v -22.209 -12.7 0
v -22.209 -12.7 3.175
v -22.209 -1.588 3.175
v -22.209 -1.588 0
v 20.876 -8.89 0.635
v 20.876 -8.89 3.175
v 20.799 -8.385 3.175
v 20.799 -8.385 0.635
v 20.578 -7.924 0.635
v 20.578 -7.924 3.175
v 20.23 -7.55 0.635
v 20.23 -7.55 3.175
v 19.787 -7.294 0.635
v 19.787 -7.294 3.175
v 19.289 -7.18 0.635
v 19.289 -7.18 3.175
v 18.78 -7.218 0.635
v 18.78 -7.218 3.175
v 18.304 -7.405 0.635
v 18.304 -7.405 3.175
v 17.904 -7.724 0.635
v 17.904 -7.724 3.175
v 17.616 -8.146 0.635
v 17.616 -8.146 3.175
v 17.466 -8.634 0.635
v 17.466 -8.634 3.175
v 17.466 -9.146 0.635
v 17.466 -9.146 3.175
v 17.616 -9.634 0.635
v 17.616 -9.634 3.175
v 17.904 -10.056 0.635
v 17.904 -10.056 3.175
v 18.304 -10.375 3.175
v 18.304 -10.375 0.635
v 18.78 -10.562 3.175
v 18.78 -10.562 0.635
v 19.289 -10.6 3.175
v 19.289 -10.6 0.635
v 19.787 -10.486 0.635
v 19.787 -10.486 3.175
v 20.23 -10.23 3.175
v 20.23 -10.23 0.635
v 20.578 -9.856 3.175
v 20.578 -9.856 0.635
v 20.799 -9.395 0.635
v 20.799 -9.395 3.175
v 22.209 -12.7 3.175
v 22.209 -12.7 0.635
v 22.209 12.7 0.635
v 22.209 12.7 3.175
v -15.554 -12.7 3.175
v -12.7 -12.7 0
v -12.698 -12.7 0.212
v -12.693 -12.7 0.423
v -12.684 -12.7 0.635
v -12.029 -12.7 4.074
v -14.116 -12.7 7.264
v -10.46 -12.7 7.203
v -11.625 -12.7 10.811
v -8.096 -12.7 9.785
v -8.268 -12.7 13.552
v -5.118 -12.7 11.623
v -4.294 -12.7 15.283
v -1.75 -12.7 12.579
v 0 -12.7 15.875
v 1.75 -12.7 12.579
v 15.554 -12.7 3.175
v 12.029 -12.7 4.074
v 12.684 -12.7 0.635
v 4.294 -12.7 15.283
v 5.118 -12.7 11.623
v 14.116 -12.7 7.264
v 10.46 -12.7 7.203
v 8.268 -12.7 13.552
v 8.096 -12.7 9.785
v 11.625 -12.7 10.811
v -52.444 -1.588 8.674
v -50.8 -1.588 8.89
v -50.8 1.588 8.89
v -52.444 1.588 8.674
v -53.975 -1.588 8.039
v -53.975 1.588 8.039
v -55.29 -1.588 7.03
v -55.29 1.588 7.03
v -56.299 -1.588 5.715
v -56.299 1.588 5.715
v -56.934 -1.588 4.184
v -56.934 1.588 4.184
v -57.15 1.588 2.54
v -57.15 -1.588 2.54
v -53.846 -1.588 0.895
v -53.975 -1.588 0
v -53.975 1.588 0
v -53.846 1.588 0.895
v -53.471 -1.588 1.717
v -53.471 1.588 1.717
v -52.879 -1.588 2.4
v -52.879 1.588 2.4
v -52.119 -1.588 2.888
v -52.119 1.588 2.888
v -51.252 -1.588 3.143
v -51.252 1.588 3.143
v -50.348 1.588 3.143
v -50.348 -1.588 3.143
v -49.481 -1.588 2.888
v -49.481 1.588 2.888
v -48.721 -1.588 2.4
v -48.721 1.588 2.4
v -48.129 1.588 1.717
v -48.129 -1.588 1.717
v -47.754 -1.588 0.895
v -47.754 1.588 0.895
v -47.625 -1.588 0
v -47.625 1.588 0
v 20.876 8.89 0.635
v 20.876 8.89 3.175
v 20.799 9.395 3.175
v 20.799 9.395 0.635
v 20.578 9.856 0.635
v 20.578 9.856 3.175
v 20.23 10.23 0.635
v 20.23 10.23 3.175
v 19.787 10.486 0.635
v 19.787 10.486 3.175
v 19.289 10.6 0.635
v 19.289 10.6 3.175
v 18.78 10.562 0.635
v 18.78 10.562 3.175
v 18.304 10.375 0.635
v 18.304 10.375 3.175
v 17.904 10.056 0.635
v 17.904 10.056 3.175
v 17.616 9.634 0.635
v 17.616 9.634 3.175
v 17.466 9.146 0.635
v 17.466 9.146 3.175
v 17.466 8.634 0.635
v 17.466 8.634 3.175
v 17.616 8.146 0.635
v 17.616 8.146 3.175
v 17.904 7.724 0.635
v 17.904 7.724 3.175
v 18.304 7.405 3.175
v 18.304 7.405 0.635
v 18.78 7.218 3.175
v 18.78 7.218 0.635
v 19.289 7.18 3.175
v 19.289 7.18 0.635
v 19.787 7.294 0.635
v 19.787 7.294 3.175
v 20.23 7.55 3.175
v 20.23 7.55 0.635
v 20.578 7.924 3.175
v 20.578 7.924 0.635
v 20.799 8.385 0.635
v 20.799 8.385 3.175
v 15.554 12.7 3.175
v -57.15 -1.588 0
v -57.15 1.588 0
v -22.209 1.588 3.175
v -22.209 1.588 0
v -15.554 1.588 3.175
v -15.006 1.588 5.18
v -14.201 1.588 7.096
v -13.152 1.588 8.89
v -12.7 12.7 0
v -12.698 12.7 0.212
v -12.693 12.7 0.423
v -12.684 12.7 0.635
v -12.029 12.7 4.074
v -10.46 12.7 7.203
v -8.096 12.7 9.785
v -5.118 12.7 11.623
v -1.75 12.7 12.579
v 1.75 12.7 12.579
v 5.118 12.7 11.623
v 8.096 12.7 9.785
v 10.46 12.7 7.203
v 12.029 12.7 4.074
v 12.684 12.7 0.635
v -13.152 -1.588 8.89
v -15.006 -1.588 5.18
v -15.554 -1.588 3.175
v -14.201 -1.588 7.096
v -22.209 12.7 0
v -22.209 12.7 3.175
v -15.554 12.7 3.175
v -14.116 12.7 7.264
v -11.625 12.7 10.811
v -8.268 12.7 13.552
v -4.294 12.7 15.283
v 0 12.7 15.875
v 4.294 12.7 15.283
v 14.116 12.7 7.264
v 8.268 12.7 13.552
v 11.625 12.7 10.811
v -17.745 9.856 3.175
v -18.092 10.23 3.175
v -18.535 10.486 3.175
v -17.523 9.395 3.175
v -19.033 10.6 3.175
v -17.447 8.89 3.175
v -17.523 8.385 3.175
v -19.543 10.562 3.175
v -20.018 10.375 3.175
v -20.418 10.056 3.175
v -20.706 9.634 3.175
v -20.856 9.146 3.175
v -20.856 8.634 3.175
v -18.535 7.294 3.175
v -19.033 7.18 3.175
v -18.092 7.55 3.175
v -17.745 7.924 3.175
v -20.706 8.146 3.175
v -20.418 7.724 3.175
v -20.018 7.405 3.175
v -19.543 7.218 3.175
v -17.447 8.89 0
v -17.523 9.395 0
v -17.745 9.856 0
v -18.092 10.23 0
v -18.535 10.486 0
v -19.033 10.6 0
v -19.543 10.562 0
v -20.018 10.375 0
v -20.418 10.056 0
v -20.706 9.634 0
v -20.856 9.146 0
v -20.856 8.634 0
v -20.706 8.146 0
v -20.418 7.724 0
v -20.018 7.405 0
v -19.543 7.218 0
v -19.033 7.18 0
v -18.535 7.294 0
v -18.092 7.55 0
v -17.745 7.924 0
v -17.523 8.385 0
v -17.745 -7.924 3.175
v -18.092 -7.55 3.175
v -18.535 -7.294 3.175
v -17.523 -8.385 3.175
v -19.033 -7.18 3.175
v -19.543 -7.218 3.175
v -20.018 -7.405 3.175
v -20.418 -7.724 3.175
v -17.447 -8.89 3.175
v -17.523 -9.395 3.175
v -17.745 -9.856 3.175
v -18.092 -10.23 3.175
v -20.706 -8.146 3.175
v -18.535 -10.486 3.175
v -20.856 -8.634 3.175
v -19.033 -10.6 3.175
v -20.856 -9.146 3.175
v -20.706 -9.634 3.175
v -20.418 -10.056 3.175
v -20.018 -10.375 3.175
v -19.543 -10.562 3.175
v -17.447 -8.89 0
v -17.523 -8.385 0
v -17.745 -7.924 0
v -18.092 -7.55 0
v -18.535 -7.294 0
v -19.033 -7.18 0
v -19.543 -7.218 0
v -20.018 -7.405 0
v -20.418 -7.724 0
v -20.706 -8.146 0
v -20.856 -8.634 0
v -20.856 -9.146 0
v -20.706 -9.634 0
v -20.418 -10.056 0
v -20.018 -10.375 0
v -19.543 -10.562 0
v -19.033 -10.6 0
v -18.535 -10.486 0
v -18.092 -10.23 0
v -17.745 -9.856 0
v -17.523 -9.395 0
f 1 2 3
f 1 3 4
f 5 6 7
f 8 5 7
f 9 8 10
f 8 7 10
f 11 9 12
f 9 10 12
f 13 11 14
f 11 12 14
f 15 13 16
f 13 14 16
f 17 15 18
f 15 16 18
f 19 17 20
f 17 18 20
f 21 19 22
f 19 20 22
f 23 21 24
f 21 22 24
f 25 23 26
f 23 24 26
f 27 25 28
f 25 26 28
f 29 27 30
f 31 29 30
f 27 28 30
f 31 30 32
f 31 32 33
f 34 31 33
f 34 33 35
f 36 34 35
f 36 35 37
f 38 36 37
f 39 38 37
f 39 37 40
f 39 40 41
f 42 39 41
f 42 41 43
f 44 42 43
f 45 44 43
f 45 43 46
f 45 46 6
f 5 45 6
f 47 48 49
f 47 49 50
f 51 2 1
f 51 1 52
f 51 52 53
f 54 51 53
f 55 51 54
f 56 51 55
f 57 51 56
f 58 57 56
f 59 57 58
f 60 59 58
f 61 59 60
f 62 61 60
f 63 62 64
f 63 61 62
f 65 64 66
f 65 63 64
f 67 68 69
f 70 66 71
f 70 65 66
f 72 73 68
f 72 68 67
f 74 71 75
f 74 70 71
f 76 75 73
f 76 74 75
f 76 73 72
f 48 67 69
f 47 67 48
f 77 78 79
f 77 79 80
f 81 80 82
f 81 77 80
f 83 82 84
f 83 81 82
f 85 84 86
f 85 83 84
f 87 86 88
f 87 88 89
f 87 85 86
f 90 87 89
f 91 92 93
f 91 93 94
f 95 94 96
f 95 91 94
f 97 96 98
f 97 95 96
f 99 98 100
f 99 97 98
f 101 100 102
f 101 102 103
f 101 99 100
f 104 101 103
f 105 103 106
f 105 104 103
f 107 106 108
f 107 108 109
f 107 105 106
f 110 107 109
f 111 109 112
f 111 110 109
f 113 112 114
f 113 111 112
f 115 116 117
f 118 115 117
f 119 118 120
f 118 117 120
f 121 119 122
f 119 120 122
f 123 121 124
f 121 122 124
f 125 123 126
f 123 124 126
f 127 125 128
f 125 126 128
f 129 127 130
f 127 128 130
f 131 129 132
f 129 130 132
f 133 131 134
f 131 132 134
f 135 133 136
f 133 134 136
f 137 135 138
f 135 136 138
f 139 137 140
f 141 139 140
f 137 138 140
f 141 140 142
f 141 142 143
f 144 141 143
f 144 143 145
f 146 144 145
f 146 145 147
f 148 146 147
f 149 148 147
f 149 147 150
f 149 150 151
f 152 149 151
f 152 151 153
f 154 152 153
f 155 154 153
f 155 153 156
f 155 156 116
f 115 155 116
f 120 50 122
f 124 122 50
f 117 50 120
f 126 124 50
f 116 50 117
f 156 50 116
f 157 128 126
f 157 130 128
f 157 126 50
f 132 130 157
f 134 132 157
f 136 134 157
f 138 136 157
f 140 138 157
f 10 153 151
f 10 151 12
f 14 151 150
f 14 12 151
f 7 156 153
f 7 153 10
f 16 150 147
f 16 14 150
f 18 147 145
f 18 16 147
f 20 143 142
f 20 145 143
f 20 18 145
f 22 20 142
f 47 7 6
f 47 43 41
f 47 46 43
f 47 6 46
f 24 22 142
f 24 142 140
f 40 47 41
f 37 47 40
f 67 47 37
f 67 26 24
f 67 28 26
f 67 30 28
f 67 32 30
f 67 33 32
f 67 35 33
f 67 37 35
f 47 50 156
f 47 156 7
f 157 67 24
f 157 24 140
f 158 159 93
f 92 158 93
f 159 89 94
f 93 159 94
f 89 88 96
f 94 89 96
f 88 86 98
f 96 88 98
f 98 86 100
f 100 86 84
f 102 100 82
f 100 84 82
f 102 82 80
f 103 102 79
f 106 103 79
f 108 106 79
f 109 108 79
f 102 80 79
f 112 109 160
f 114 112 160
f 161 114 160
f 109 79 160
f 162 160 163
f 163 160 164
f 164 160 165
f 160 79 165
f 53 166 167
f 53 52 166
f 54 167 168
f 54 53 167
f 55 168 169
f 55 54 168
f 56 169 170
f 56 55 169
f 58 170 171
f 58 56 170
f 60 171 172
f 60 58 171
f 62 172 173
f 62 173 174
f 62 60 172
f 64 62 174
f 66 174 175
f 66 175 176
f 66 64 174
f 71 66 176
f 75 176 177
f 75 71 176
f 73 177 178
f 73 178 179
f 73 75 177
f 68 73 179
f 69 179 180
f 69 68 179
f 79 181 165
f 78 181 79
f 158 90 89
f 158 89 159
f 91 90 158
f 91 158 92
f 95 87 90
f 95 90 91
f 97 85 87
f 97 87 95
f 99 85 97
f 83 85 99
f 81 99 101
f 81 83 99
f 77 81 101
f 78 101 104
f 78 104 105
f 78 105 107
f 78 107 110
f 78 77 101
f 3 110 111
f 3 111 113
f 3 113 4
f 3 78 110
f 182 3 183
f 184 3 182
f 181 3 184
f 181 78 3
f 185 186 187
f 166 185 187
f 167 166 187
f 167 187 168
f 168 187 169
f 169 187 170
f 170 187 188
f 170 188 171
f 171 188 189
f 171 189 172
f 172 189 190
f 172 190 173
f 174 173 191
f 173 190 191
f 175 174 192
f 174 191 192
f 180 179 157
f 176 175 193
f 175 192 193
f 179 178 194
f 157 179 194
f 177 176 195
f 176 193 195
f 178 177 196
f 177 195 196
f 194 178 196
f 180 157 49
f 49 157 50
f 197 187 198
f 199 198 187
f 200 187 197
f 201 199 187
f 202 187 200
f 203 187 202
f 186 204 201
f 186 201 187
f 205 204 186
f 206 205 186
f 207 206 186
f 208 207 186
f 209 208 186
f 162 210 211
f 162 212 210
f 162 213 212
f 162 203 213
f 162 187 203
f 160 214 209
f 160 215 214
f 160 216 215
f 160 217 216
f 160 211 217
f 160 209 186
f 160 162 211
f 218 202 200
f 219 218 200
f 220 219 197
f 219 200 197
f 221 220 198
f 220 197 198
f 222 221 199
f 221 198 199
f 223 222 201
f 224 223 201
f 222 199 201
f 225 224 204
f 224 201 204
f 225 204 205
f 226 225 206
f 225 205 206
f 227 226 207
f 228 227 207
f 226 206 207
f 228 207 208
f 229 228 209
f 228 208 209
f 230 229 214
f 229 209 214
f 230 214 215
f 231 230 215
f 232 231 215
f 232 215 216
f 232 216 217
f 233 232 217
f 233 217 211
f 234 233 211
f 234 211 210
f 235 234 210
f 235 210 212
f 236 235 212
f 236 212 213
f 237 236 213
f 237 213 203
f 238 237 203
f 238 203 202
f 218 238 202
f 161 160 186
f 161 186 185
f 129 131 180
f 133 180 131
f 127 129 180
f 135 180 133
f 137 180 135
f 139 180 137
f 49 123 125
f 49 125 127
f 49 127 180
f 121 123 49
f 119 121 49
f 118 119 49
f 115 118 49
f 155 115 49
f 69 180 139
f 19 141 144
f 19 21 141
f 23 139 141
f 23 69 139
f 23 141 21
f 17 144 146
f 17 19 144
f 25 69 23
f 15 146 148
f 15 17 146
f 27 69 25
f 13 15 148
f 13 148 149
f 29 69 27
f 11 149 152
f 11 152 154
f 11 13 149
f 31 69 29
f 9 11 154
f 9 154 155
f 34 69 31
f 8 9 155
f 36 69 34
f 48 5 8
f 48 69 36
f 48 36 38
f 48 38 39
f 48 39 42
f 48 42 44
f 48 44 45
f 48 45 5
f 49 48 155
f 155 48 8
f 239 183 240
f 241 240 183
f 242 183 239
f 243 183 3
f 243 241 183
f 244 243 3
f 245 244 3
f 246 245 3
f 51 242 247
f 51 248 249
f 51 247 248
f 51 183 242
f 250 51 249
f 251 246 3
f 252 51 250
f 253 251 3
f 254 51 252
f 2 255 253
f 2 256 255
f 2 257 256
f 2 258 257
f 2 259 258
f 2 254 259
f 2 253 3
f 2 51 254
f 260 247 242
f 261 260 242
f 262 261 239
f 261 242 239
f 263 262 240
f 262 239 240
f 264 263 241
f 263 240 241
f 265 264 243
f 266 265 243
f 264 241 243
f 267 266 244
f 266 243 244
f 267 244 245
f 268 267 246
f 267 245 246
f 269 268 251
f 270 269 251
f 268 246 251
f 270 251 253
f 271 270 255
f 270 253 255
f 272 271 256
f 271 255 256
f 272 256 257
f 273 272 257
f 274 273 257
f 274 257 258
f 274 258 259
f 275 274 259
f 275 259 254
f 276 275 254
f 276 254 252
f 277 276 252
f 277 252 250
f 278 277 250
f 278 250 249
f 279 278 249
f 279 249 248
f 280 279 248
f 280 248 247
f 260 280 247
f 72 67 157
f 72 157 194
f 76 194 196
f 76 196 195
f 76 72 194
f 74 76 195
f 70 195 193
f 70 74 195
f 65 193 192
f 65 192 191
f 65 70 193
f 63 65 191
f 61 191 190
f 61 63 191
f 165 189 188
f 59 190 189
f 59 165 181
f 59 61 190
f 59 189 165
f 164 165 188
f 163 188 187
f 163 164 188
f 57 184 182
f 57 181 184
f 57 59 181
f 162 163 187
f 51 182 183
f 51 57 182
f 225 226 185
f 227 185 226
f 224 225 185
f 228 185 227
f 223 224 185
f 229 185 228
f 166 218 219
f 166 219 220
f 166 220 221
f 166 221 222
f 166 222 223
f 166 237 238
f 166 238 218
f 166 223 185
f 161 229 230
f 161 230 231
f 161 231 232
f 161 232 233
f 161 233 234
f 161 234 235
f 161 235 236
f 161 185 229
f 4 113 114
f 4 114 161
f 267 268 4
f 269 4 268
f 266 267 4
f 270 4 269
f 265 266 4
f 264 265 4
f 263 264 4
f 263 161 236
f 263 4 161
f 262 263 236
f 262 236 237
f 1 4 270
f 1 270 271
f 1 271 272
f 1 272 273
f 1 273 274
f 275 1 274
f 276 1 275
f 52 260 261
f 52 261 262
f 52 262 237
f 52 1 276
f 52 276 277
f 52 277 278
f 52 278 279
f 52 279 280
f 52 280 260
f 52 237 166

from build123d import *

# Parameters (mm, degrees)
F1_DEPTH = 12.7
F3_DEPTH = 1.5875
F4_R     = 1.7145
F5_DEPTH = 25.4


with BuildPart() as f1:
    # F0 (on Front) → F1 (new body, symmetric)
    with BuildSketch(Plane.XZ):
        with BuildLine():
            ThreePointArc((-12.6841150657, 0.635), (0, 12.7), (12.6841150657, 0.635))
            Line((12.6841150657, 0.635), (22.2091150657, 0.635))
            Line((22.2091150657, 0.635), (22.2091150657, 3.175))
            Line((22.2091150657, 3.175), (15.5542598667, 3.175))
            ThreePointArc((15.5542598667, 3.175), (0, 15.875), (-15.5542598667, 3.175))
            Line((-15.5542598667, 3.175), (-22.2091150657, 3.175))
            Line((-22.2091150657, 3.175), (-22.2091150657, 0.635))
            Line((-22.2091150657, 0.635), (-22.2091150657, 0))
            Line((-22.2091150657, 0), (-12.7, 0))
            ThreePointArc((-12.7, 0), (-12.6960281453, 0.3175993274), (-12.6841150657, 0.635))
        make_face()
    extrude(amount=F1_DEPTH, both=True)

    # F2 (on Front) → F3 (join, symmetric)
    with BuildSketch(Plane.XZ):
        with BuildLine():
            ThreePointArc((-15.5542598667, 3.175), (-14.6349663523, 6.1508848848), (-13.1523201375, 8.89))
            Line((-13.1523201375, 8.89), (-50.8, 8.89))
            ThreePointArc((-50.8, 8.89), (-55.2901280605, 7.0301280605), (-57.15, 2.54))
            Line((-57.15, 2.54), (-57.15, 0))
            Line((-57.15, 0), (-53.975, 0))
            ThreePointArc((-53.975, 0), (-50.8, 3.175), (-47.625, 0))
            Line((-47.625, 0), (-22.2091150657, 0))
            Line((-22.2091150657, 0), (-22.2091150657, 3.175))
            Line((-22.2091150657, 3.175), (-15.5542598667, 3.175))
        make_face()
    extrude(amount=F3_DEPTH, both=True)

    # F4 (on face) → F5 (cut)
    with BuildSketch(Plane.XY.offset(3.175)):
        with Locations((19.1611150657, 8.89)):
            Circle(F4_R)
        with Locations((19.1611150657, -8.89)):
            Circle(F4_R)
        with Locations((-19.1611150657, -8.89)):
            Circle(F4_R)
        with Locations((-19.1611150657, 8.89)):
            Circle(F4_R)
    extrude(amount=-F5_DEPTH, mode=Mode.SUBTRACT)


solid = f1.part
